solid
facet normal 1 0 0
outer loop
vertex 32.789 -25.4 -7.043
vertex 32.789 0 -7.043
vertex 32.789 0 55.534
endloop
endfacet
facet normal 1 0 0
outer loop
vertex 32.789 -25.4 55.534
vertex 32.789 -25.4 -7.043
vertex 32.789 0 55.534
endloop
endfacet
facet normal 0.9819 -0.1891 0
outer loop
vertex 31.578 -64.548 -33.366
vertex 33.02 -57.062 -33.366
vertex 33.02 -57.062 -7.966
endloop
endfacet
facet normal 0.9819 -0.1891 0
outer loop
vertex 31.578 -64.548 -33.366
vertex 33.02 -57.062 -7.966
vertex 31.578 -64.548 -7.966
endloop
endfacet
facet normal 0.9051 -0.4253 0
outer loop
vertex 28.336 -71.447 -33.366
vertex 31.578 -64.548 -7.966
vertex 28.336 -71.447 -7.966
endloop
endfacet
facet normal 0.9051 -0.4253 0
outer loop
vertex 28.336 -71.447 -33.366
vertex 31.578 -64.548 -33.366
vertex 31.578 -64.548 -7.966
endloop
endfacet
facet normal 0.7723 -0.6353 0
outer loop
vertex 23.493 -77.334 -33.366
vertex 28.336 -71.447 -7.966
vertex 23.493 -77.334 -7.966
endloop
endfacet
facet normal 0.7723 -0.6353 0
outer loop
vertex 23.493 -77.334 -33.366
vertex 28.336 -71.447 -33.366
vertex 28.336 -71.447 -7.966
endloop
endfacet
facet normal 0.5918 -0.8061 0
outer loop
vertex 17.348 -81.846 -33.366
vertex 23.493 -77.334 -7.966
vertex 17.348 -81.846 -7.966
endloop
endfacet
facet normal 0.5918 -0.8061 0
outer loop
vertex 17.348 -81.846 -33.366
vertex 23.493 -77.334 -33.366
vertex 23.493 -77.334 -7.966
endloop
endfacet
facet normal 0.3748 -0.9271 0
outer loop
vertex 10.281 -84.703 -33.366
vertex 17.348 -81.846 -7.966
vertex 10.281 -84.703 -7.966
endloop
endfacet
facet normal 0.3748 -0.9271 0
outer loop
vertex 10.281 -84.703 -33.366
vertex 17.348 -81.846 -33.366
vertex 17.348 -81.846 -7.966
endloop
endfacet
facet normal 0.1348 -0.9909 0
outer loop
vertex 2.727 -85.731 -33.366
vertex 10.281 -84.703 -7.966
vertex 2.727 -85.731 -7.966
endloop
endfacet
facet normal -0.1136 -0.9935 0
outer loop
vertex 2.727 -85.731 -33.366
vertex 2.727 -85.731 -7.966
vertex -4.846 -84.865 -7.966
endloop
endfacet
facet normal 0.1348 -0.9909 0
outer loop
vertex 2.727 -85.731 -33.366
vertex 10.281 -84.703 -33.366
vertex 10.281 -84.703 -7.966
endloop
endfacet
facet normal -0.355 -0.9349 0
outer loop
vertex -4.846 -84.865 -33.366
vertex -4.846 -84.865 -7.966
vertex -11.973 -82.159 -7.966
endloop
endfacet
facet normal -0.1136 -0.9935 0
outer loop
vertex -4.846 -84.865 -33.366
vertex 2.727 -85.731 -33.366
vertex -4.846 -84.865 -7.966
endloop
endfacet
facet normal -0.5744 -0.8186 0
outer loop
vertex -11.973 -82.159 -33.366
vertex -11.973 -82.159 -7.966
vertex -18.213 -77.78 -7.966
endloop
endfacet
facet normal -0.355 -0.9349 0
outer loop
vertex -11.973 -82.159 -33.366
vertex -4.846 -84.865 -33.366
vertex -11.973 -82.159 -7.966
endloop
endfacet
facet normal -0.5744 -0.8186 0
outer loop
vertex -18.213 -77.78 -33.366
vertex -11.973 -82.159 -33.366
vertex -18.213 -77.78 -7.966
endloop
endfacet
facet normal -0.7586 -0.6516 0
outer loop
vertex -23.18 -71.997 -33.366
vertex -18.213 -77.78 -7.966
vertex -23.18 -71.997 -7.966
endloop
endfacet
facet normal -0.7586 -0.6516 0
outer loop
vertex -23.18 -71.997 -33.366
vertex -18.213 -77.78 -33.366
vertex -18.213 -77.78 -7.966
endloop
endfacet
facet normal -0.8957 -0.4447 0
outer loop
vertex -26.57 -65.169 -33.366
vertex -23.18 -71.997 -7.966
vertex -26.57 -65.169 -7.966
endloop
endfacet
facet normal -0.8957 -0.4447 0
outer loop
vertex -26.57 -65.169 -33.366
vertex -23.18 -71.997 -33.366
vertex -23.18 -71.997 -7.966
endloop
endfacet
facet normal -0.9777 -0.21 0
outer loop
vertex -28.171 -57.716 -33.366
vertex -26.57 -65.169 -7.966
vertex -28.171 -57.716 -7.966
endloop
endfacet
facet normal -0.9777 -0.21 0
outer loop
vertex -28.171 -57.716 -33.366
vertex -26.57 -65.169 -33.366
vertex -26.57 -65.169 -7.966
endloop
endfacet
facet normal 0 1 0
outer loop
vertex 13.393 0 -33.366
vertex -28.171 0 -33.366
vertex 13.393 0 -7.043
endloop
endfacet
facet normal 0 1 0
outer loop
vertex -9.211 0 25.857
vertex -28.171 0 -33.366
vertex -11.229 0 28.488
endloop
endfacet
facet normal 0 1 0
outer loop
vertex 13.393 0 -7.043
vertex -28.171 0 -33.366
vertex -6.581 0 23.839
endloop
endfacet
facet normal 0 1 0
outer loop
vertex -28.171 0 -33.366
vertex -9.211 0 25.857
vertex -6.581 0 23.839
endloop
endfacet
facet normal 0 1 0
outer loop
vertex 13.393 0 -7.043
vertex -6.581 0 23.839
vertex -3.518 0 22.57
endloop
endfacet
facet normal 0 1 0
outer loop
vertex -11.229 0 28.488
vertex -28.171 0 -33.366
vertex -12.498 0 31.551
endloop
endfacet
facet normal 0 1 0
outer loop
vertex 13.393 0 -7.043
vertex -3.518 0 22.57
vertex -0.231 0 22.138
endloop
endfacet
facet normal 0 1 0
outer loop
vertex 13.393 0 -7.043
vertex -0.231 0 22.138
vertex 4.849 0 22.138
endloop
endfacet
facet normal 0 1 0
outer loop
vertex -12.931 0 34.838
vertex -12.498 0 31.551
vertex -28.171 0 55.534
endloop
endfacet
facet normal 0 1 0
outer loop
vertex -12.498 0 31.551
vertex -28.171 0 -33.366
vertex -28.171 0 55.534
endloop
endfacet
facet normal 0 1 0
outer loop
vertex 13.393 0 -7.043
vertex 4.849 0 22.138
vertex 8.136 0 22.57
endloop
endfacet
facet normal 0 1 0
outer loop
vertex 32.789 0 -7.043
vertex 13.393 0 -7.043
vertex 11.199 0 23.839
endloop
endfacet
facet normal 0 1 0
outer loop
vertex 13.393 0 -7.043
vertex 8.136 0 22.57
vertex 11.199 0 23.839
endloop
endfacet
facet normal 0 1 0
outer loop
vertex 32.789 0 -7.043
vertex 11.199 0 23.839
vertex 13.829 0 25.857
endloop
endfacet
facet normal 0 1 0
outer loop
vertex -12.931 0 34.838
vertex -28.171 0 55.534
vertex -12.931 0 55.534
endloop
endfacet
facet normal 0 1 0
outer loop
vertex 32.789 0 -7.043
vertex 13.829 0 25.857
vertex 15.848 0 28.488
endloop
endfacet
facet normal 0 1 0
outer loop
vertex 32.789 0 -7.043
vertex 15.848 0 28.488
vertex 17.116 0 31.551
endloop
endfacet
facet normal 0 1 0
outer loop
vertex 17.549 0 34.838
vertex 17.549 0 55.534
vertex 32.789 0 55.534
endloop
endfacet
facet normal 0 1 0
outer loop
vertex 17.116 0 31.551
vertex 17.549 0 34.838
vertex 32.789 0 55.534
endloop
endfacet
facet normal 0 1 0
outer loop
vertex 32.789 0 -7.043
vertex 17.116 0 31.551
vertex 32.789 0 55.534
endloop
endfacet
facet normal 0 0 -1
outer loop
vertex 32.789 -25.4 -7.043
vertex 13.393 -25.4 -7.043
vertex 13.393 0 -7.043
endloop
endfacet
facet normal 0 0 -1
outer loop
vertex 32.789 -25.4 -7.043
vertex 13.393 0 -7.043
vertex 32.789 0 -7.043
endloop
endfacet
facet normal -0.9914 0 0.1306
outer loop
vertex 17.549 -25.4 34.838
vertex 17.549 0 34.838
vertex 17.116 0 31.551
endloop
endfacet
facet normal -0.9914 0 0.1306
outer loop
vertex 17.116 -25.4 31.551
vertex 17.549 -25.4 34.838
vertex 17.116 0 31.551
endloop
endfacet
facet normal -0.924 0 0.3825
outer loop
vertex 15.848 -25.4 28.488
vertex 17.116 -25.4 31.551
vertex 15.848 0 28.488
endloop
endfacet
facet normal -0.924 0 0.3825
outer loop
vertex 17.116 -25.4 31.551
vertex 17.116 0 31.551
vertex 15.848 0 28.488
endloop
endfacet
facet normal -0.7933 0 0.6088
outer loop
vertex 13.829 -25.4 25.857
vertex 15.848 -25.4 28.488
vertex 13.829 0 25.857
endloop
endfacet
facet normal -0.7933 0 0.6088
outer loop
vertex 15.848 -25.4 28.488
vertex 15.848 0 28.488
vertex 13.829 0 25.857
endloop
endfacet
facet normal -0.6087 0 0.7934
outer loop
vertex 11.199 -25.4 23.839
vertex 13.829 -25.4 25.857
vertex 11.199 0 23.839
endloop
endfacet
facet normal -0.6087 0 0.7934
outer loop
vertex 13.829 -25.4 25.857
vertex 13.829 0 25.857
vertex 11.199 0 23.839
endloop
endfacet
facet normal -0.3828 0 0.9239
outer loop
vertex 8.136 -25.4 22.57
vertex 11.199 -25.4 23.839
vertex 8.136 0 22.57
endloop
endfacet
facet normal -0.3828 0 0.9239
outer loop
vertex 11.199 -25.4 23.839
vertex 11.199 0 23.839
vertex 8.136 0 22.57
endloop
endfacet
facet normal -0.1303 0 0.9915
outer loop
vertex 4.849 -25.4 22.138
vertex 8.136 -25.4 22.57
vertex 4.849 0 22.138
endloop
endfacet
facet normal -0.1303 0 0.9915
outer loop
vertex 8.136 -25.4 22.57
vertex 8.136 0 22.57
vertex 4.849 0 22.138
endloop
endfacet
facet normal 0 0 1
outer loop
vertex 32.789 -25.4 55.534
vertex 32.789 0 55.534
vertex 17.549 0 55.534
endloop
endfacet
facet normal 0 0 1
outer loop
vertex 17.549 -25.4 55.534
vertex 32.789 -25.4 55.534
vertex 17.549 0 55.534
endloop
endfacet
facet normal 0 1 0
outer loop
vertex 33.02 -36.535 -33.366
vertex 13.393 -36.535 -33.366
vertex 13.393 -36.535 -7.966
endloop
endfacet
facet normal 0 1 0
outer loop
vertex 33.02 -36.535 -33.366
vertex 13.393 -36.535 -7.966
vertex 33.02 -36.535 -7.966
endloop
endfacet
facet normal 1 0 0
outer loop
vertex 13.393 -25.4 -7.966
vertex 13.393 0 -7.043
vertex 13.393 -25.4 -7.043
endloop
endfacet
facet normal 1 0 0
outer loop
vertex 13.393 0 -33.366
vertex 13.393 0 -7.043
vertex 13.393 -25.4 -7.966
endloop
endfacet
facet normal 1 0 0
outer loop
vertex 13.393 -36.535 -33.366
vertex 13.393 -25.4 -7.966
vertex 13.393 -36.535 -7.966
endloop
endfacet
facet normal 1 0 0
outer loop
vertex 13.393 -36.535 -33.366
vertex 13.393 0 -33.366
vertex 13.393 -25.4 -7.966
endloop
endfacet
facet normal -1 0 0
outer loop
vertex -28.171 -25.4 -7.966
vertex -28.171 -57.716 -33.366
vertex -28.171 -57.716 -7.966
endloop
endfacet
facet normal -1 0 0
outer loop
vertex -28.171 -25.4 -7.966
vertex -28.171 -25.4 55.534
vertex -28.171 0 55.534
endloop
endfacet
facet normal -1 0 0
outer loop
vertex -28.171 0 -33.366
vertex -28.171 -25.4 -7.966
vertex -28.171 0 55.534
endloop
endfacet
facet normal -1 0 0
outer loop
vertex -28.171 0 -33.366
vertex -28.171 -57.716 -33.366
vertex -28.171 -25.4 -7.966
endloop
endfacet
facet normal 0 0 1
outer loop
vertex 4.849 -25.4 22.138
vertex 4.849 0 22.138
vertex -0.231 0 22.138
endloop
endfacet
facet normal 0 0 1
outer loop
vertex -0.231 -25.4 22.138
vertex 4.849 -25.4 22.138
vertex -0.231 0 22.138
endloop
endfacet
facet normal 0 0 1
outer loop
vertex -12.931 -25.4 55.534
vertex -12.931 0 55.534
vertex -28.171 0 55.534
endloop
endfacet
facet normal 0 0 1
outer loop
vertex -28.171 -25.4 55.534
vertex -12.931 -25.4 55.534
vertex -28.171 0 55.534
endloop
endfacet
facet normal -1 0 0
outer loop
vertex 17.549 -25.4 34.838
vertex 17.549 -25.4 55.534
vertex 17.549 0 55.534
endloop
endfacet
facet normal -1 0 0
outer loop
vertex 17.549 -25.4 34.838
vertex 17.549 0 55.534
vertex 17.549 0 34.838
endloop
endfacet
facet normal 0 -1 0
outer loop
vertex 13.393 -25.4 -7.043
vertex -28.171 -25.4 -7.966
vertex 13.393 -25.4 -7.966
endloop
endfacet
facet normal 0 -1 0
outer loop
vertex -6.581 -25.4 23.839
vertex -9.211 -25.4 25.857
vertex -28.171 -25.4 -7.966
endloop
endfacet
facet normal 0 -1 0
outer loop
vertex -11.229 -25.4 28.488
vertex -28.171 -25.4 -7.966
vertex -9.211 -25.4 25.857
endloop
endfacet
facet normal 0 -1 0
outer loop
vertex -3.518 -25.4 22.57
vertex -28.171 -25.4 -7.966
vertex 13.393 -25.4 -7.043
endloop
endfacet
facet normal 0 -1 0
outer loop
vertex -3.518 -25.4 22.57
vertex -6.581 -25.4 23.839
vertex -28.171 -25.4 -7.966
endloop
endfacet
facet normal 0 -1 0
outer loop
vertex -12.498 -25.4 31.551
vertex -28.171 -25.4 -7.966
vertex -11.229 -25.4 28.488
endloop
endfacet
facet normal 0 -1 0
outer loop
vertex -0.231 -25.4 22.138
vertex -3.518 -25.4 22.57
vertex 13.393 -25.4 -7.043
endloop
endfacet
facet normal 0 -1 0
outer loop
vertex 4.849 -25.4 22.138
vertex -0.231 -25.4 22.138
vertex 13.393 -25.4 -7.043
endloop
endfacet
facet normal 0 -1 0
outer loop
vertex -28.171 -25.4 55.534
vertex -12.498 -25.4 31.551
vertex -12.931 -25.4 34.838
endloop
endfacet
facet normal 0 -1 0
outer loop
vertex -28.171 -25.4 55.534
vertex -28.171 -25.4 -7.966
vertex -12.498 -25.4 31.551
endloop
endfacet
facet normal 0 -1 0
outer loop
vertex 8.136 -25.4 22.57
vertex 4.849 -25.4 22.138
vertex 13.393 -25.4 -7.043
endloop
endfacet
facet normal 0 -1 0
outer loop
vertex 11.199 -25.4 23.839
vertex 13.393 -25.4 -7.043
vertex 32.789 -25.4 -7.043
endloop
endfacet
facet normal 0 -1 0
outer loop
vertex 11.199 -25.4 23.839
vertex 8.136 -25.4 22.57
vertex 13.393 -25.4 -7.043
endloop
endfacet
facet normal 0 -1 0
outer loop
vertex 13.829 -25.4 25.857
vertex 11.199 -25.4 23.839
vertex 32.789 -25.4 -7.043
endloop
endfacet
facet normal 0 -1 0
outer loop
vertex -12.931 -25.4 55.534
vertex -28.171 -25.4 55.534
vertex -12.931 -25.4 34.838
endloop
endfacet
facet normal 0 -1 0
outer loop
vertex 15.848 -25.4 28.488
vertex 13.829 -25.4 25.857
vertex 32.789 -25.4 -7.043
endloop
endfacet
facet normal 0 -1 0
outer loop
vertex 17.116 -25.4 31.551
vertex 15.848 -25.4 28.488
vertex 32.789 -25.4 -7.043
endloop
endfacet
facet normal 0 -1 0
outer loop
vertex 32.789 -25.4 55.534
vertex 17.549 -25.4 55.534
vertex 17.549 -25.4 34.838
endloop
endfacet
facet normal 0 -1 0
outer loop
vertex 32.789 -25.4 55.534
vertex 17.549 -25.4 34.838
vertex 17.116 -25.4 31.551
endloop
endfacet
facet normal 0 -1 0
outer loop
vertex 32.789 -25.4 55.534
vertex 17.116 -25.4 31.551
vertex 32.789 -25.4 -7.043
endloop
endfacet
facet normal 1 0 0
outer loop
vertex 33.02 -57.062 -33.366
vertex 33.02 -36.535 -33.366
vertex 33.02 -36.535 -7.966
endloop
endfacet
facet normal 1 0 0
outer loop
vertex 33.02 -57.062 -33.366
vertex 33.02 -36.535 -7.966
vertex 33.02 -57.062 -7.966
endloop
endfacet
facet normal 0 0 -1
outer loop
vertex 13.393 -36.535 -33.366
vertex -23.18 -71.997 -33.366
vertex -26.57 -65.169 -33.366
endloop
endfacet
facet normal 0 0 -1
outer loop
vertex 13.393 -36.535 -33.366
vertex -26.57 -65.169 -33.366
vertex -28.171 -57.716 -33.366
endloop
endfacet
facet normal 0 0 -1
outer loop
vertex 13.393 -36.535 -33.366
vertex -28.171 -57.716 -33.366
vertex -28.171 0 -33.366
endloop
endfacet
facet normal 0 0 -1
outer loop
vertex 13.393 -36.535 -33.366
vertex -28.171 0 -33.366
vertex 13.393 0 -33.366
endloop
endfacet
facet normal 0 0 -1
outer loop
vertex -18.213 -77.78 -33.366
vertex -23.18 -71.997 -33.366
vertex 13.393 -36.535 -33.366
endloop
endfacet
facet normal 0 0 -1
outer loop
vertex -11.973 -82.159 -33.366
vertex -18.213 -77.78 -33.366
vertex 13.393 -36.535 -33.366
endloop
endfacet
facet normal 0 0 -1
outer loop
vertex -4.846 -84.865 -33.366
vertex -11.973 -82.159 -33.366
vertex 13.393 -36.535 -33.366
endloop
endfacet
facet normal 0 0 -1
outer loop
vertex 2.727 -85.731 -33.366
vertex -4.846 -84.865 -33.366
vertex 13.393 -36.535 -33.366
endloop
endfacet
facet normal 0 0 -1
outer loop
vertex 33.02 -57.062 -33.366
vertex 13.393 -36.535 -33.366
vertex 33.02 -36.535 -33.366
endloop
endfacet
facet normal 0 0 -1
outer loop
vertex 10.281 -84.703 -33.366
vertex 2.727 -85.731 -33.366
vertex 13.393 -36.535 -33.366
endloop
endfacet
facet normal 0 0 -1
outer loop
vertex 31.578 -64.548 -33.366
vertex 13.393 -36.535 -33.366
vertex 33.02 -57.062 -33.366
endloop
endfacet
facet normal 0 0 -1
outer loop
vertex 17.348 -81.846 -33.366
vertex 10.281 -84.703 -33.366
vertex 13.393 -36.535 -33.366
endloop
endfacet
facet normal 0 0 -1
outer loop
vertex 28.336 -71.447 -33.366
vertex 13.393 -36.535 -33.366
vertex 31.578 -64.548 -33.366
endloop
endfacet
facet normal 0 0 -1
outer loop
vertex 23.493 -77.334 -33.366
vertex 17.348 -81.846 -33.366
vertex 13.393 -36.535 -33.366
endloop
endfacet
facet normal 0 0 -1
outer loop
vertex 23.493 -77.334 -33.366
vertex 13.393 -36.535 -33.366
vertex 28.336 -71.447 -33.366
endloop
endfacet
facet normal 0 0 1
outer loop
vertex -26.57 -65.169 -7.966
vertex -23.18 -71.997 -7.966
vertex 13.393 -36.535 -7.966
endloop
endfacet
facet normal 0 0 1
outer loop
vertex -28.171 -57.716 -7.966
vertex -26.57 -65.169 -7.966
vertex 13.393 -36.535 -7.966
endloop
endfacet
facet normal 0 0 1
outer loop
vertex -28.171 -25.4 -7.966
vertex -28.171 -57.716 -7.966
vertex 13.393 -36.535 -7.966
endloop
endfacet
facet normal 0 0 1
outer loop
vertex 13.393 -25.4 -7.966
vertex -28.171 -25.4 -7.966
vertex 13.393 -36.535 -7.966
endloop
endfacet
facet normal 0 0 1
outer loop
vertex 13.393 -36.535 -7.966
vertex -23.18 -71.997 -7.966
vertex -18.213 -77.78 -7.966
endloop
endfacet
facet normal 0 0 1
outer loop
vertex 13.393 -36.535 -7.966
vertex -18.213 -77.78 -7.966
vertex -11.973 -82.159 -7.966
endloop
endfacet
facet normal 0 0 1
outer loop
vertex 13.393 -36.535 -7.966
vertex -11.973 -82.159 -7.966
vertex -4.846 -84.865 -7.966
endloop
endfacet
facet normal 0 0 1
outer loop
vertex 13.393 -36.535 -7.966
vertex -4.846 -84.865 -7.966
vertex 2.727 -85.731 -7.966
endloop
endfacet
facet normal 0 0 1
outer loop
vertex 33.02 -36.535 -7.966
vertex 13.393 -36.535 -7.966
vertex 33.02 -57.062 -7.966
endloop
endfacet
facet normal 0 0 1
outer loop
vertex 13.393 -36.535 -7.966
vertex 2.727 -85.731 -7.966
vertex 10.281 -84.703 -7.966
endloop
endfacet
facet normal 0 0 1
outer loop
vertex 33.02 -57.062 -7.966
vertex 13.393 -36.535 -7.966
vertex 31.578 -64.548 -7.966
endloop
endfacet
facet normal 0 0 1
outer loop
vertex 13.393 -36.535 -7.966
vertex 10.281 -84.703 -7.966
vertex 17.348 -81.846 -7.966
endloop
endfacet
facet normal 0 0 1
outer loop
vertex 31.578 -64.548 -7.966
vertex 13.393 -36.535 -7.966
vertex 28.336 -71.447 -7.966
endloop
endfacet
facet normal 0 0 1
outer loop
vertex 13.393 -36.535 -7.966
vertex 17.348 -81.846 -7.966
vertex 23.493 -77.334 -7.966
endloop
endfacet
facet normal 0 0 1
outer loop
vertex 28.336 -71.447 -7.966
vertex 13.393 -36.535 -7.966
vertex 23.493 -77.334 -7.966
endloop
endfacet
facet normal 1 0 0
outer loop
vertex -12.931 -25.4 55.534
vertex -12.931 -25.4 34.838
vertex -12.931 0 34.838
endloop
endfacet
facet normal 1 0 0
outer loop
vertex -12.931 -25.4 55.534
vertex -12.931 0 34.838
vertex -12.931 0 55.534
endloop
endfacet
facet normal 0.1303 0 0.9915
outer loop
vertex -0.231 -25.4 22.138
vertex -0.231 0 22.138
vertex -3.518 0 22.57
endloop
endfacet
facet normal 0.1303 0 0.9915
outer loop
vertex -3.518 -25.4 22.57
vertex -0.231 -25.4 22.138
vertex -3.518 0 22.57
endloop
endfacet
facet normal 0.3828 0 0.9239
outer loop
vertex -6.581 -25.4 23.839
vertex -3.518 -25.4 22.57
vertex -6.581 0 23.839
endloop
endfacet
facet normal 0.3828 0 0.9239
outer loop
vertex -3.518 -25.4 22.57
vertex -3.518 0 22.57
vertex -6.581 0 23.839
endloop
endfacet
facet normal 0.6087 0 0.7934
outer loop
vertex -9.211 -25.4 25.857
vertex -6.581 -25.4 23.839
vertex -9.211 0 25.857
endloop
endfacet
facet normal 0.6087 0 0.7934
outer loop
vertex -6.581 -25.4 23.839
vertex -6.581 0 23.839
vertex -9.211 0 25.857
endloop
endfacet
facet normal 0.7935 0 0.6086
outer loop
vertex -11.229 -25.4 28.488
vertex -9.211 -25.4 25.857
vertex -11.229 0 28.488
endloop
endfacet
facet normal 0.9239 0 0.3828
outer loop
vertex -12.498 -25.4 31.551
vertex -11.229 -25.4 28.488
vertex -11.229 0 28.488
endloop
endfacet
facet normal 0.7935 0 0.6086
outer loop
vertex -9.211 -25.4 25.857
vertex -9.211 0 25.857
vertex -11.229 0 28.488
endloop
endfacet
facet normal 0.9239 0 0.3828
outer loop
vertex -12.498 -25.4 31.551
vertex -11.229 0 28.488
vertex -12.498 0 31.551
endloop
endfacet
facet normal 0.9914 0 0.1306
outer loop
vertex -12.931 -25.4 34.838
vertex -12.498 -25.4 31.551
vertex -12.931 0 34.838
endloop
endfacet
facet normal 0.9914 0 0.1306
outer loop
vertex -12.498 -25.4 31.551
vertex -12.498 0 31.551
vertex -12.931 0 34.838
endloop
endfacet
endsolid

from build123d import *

# Parameters (mm, degrees)
F1_DEPTH = 25.4
F3_DEPTH = 25.4


with BuildPart() as f1:
    # F0 (on Front) → F1 (new body)
    with BuildSketch(Plane.XZ):
        with BuildLine():
            Line((-28.17091, 55.533636), (-28.17091, -33.366363))
            Line((-28.17091, -33.366363), (13.392729, -33.366363))
            Line((13.392729, -33.366363), (13.392729, -7.042727))
            Line((13.392729, -7.042727), (32.789093, -7.042727))
            Line((32.789093, -7.042727), (32.789093, 55.533636))
            Line((32.789093, 55.533636), (17.549092, 55.533636))
            Line((17.549092, 55.533636), (17.549092, 34.837736))
            ThreePointArc((17.549092, 34.837736), (13.829348, 25.85748), (4.849092, 22.137736))
            Line((4.849092, 22.137736), (-0.230909, 22.137736))
            ThreePointArc((-0.230909, 22.137736), (-9.211165, 25.85748), (-12.930909, 34.837736))
            Line((-12.930909, 34.837736), (-12.930909, 55.533636))
            Line((-12.930909, 55.533636), (-28.17091, 55.533636))
        make_face()
    extrude(amount=F1_DEPTH)

    # F2 (on face) → F3 (join)
    with BuildSketch(Plane(origin=(0, 0, -33.366363), x_dir=(1, 0, 0), z_dir=(0, 0, -1))):
        with BuildLine():
            Line((-28.17091, 57.715932), (-28.17091, 0))
            Line((-28.17091, 0), (13.392729, 0))
            Line((13.392729, 0), (13.392729, 36.534619))
            Line((13.392729, 36.534619), (33.020001, 36.534619))
            Line((33.020001, 36.534619), (33.020001, 57.062088))
            ThreePointArc((33.020001, 57.062088), (2.727389, 85.731034), (-28.17091, 57.715932))
        make_face()
    extrude(amount=-F3_DEPTH)


solid = f1.part
